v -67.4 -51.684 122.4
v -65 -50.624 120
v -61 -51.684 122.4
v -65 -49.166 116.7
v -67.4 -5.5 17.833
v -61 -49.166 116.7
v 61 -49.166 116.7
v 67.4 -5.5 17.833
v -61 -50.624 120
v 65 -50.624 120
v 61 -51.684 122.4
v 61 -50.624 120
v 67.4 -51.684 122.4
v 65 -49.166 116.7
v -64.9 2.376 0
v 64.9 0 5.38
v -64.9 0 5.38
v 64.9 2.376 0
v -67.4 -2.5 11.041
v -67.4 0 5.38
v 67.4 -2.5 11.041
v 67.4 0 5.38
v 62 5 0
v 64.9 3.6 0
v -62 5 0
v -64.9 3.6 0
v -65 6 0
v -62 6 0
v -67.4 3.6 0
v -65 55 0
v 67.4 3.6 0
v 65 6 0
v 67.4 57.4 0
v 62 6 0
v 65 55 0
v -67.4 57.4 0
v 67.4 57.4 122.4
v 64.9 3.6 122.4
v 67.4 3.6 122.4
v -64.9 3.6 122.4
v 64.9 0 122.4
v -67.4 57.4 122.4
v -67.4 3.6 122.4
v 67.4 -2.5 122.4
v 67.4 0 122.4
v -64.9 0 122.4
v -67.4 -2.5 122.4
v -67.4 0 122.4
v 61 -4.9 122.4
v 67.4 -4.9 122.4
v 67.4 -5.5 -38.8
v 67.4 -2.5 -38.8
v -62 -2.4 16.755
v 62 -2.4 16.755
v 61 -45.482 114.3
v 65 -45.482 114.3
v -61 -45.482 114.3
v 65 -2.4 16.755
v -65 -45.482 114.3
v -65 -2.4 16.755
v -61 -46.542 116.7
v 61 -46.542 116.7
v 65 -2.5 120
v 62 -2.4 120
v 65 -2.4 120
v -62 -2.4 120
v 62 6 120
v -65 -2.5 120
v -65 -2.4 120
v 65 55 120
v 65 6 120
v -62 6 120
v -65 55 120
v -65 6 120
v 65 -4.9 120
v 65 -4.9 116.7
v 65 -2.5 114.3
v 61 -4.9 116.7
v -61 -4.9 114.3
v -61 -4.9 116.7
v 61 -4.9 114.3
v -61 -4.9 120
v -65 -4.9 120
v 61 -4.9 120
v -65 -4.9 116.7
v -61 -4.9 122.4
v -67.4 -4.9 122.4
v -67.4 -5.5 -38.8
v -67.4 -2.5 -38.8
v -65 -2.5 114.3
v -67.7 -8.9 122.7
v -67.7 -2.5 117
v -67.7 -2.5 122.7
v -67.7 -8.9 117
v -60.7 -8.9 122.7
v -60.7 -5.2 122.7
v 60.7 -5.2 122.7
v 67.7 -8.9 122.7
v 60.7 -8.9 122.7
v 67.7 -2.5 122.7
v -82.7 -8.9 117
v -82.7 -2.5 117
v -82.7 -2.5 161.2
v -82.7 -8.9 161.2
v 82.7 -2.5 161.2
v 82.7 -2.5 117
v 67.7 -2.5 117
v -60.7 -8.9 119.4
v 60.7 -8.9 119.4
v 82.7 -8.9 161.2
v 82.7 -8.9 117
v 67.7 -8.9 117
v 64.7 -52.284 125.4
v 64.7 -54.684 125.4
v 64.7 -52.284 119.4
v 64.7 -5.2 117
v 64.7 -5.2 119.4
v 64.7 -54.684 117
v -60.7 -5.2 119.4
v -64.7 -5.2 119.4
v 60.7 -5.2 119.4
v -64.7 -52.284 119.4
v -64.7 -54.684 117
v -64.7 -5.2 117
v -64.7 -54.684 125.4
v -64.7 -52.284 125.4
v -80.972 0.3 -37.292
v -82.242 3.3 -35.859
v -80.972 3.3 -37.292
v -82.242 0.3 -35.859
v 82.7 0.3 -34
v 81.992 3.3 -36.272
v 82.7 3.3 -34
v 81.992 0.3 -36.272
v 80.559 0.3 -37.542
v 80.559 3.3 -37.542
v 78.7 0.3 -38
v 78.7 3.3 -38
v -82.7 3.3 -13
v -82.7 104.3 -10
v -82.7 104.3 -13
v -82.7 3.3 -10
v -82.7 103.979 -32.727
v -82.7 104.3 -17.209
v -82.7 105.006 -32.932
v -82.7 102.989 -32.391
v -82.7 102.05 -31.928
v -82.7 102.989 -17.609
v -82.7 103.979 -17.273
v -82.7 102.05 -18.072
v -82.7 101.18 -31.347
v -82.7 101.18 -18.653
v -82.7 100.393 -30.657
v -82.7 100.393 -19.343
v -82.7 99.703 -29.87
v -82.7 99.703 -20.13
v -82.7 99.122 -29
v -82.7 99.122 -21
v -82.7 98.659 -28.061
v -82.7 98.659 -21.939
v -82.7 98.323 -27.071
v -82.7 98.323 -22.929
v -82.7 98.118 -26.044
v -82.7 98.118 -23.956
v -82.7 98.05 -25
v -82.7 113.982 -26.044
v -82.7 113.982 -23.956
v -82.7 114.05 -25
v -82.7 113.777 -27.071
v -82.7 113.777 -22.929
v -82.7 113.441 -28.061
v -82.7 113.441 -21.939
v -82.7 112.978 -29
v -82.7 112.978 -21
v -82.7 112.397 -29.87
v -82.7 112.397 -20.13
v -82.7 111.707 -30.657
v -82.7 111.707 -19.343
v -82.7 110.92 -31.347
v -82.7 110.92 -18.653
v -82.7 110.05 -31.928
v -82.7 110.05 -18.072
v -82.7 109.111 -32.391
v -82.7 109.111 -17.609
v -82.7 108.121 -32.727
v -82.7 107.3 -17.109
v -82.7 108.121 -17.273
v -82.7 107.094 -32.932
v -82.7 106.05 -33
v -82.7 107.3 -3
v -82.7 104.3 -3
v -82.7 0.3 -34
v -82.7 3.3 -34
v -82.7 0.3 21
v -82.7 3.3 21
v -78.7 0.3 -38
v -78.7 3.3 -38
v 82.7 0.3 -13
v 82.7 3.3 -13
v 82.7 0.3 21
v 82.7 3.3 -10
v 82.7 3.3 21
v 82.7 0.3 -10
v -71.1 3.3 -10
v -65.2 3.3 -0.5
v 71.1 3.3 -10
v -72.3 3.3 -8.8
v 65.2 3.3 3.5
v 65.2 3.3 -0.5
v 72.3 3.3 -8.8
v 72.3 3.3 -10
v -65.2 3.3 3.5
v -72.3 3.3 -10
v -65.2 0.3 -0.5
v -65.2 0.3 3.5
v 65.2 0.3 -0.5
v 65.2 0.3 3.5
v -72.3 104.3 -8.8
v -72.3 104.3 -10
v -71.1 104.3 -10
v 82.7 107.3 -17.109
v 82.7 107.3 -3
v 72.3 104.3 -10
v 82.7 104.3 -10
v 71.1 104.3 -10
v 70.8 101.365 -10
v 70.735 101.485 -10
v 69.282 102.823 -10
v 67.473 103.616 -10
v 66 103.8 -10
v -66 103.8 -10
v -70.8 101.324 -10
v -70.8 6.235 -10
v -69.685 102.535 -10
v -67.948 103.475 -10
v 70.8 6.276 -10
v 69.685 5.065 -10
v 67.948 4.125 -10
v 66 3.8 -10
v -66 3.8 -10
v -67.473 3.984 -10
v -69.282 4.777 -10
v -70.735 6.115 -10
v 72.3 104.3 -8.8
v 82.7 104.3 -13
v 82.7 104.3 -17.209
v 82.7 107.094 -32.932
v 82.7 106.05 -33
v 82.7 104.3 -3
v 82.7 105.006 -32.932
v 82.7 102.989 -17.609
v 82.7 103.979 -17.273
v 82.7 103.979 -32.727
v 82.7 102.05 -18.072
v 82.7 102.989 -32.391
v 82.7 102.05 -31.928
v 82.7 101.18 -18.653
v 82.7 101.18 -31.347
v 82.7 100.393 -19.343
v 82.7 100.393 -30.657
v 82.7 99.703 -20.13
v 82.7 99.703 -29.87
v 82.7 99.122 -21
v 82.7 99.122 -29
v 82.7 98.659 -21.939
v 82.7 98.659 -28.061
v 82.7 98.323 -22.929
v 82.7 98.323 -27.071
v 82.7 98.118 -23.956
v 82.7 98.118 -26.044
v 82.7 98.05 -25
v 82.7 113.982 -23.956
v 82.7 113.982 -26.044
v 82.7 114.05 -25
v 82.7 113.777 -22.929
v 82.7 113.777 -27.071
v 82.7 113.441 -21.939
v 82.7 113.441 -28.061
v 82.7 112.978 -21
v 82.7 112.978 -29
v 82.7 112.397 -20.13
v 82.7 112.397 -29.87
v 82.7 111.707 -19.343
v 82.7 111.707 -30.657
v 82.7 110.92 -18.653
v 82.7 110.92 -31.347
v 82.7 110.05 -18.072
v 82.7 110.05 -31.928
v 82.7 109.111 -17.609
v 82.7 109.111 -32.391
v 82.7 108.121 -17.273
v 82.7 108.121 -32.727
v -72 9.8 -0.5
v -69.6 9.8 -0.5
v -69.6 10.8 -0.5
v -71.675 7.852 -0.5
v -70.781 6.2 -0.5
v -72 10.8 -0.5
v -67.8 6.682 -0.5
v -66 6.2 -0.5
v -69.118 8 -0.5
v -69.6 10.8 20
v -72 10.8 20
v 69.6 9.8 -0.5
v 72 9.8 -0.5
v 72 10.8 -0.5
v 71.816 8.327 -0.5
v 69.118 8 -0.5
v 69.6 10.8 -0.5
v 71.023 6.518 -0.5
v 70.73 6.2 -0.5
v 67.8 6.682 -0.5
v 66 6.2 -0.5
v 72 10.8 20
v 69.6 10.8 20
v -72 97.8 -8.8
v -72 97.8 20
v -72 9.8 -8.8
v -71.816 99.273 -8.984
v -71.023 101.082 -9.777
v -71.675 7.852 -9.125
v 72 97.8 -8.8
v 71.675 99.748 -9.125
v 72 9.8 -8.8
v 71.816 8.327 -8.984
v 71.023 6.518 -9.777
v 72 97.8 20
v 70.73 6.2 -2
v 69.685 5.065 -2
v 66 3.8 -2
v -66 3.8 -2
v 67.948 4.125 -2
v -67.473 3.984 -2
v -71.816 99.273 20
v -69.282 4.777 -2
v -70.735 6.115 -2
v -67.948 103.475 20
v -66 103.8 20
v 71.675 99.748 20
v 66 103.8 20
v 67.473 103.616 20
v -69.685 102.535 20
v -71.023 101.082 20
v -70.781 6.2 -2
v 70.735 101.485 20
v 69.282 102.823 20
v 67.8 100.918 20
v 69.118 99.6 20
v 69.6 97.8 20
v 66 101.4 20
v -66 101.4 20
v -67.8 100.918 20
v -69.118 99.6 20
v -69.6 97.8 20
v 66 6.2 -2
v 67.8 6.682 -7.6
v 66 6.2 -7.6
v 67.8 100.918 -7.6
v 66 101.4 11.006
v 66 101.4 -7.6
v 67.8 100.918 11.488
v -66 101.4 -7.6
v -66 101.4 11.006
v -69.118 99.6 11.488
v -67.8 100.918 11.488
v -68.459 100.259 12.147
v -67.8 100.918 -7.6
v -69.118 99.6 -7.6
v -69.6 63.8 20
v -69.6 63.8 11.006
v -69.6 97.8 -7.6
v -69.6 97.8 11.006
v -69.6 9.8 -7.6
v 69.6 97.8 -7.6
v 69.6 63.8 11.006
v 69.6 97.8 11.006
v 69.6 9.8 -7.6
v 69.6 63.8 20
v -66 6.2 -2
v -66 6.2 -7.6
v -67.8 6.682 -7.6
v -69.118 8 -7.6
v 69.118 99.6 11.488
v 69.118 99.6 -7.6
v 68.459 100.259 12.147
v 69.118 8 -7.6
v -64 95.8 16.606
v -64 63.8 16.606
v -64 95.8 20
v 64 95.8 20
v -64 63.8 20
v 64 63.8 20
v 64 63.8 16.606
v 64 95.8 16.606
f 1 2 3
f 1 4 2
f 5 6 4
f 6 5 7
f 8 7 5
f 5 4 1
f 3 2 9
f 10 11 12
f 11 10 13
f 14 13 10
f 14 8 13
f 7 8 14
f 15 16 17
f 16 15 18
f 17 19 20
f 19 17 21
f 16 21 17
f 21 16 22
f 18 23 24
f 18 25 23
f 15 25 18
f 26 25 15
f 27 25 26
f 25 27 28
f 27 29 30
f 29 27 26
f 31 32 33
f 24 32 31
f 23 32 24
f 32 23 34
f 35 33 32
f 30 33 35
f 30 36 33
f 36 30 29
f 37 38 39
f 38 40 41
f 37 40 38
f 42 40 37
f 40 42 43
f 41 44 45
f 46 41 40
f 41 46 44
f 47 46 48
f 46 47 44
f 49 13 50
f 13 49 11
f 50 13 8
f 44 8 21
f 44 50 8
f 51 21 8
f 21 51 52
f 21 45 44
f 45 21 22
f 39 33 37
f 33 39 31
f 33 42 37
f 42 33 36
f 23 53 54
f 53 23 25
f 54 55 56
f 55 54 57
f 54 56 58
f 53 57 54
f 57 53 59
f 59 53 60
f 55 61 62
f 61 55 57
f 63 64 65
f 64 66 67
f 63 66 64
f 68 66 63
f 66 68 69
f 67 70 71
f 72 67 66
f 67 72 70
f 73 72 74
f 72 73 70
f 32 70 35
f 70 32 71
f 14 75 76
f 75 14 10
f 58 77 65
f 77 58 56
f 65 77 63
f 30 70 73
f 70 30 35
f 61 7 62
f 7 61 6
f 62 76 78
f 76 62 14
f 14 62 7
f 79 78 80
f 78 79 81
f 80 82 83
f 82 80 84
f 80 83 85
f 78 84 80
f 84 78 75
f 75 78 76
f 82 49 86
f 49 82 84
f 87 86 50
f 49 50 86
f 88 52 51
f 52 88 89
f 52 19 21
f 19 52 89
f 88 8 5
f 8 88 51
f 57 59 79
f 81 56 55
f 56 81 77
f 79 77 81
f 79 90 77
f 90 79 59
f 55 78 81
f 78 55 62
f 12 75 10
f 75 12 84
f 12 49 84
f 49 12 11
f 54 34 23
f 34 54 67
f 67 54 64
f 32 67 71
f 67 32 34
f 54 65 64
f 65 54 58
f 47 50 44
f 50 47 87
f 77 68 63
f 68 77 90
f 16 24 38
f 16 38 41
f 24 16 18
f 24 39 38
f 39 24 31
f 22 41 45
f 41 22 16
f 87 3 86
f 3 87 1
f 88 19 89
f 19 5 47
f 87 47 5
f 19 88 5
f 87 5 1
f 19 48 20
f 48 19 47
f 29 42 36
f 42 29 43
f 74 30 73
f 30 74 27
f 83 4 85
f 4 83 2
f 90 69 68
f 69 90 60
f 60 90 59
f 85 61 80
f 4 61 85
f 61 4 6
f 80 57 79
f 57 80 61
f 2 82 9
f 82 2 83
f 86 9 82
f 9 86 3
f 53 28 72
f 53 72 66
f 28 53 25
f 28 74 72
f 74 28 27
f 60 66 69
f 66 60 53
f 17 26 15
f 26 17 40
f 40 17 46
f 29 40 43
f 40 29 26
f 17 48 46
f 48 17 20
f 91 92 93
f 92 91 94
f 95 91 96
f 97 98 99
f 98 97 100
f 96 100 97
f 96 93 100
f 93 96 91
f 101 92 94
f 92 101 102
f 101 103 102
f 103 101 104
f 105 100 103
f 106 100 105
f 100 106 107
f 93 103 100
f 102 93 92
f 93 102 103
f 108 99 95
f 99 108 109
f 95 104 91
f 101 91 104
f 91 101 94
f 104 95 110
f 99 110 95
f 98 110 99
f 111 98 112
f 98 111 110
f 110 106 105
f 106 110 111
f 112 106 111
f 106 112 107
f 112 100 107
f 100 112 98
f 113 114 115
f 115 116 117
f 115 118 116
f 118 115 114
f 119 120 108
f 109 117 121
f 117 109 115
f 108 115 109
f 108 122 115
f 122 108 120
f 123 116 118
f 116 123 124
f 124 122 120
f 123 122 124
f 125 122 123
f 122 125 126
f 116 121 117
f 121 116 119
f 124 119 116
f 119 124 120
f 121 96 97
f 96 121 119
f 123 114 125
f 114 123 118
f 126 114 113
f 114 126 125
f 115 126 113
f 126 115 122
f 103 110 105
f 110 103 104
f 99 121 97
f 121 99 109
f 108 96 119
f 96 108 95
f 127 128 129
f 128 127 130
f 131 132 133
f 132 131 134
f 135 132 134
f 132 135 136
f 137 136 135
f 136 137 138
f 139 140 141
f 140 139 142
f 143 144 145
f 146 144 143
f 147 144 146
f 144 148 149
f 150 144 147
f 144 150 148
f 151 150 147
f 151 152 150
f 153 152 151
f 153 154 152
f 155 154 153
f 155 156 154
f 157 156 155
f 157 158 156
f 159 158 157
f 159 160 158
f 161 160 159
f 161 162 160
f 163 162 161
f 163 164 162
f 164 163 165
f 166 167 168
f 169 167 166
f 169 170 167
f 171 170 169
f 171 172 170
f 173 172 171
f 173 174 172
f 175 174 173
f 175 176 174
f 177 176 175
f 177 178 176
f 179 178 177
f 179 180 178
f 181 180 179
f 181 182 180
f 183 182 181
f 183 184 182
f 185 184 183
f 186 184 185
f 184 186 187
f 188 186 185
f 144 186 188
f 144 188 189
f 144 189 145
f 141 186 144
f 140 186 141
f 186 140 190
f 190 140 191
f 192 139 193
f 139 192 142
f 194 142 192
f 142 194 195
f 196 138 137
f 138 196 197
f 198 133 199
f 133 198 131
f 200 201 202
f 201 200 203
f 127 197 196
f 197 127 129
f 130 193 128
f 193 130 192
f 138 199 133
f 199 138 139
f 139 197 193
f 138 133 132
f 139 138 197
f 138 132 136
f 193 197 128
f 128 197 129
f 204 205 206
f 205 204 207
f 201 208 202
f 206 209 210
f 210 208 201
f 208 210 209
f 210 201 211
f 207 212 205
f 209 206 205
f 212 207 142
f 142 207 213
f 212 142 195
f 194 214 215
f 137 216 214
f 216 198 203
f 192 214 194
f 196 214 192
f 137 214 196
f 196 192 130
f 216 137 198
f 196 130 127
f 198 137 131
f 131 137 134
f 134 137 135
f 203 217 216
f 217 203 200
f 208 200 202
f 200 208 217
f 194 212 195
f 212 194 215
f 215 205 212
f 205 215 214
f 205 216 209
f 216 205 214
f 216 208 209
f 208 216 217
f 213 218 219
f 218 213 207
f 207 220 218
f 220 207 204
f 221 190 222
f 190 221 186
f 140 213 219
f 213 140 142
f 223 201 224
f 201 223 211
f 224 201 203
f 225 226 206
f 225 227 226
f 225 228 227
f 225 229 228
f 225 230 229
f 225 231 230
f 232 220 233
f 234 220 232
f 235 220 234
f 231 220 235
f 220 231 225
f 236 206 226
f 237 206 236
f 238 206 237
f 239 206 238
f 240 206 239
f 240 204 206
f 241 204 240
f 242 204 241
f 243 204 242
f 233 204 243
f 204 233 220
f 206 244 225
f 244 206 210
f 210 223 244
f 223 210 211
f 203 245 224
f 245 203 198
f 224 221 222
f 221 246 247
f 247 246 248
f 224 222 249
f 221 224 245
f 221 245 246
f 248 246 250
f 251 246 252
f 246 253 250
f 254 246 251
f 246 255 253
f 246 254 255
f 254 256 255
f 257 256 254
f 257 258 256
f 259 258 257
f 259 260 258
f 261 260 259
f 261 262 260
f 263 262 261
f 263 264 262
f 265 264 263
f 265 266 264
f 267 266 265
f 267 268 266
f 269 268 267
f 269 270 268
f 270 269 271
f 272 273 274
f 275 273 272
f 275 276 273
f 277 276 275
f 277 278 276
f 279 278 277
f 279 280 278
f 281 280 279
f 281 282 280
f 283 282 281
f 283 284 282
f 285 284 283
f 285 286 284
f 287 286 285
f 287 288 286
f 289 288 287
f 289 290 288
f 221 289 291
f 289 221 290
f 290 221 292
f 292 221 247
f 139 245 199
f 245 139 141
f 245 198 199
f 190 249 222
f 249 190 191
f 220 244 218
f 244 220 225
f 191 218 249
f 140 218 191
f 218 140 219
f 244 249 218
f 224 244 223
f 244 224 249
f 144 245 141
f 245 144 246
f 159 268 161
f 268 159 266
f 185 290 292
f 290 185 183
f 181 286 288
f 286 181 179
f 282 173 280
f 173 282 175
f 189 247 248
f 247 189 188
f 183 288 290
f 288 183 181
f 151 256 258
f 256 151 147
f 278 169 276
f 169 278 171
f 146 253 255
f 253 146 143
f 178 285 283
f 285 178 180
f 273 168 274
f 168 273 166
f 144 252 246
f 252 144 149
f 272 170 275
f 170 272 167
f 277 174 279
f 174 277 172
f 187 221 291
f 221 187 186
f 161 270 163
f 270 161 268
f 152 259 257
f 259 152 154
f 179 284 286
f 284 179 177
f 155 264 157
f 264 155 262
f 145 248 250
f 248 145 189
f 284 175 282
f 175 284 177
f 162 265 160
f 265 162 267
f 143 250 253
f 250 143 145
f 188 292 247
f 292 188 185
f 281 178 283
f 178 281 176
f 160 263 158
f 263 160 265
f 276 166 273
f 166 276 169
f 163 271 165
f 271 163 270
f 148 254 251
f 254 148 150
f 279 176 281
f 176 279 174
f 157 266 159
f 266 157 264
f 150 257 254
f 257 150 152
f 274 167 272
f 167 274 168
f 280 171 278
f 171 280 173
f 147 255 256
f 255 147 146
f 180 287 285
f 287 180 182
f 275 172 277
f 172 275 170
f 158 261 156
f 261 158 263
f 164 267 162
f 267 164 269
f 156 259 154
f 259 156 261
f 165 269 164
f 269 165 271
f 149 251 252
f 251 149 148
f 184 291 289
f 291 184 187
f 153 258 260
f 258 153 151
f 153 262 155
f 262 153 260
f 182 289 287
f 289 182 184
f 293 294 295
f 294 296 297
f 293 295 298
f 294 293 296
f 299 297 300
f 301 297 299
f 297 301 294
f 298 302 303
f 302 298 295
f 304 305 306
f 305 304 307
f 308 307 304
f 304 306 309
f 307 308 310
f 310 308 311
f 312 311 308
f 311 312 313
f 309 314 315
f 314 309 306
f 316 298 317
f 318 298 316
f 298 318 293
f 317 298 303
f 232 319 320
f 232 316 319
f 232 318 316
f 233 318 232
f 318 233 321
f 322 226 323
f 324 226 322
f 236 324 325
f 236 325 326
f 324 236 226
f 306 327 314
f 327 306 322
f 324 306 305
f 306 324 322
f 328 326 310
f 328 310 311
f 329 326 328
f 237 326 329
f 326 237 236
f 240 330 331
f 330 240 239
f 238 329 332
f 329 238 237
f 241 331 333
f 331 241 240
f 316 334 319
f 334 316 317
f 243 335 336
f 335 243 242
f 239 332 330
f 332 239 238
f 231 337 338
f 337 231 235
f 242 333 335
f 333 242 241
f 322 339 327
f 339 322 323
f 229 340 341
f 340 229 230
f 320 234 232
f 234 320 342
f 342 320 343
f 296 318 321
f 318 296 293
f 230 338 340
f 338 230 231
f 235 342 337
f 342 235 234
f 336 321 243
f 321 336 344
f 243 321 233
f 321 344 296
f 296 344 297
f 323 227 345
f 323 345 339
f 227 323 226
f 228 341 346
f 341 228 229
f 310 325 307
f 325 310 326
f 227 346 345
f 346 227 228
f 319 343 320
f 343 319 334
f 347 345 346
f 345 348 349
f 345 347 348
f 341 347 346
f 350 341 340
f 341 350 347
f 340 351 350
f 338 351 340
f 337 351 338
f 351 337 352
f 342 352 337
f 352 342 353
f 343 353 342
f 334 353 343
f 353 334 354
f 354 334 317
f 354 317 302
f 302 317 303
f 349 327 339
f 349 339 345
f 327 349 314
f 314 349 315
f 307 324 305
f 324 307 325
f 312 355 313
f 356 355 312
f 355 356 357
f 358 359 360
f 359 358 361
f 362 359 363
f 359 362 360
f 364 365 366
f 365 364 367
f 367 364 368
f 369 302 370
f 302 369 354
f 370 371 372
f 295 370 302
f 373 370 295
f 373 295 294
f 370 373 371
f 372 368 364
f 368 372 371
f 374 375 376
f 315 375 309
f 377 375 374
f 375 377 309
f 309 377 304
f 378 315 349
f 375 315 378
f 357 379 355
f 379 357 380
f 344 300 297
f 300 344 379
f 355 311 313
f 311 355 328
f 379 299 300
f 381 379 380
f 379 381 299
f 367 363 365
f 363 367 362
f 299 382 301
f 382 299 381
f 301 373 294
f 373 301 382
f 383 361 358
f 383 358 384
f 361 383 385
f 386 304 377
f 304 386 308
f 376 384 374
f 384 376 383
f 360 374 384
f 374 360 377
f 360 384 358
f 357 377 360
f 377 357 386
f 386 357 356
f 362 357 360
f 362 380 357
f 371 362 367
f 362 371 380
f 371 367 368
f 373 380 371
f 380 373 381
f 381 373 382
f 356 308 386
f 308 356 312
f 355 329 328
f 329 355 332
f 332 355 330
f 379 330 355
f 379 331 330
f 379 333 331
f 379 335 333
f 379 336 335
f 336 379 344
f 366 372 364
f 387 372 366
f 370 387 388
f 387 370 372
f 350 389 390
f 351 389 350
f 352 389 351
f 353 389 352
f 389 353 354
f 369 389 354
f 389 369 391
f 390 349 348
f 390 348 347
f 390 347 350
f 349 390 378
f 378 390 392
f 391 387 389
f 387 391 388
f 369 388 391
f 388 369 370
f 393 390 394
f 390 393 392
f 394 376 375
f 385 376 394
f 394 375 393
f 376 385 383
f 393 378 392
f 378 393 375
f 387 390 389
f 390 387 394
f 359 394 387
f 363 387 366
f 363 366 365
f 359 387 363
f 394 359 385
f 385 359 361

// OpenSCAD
part = "assembly";

t        = 2.4;
W_in     = 130;
H        = 120;
y_back0  = 5;
y_backT  = -48;
y_front  = 55;
bar_d    = 2.5;
door_w   = 140;
door_h   = 170;
overlap  = 15;
clr      = 0.3;
lid_t    = 2.4;
plate_t  = 3;
groove_d = 2.5;
tray_w   = 144;
tray_d   = 100;
tray_h   = 30;
lip      = 8;
perch_d  = 16;
r_edge   = 4;
ch       = 1.2;

hw       = W_in/2;
x_out    = hw + t;
z_roof   = H + t;
run      = y_back0 - y_backT;
ang      = atan2(H, run);
th_y     = t/sin(ang);
z_door0  = -(door_h - z_roof)/2;
z_door1  = z_door0 + door_h;
z_fl0    = z_door0 - overlap;
y_fl0    = -bar_d - plate_t;
y_fl1    = -bar_d;
y_lip0   = y_fl1 - t;
z_lidbot = H - 3;
z_ledge  = z_lidbot - clr - t;
y_lid0   = y_backT - th_y - run*t/H - 3;
y_ledge0 = y_backT - th_y;
y_plate0 = clr;
y_plate1 = clr + plate_t;
x_win    = x_out - groove_d + clr;
x_plate  = door_w/2 + overlap - 2.3;
z_plate0 = -38;
z_plate1 = 3.5 + (door_w/2 + overlap - 2.3) - (W_in/2 + t - groove_d + clr) + 4;
z_shelf1 = -10;
y_tray0  = y_plate1 + 0.5;
y_shelf1 = y_tray0 + tray_d + 3.5;
perch_y  = y_shelf1 - 1.25;
perch_z  = -25;

echo(wall_angle_deg=ang, slot_width=y_front-y_back0, through_w=2*x_out, through_h=z_roof, door_z0=z_door0);

module prof_interior() polygon([[y_back0,0],[y_front,0],[y_front,H],[y_backT,H]]);
module prof_outer()    polygon([[y_back0-th_y,0],[y_front+t,0],[y_front+t,z_roof],[y_backT-th_y-run*t/H,z_roof]]);
module yz(x0,x1) translate([x0,0,0]) rotate([90,0,90]) linear_extrude(height=x1-x0) children();
module outer_prism() yz(0,x_out) prof_outer();

module under_back_wall() translate([0,y_back0-th_y,0]) rotate([-ang,0,0]) translate([-200,-150,-400]) cube([400,300,400]);

module body_half() {
  difference() {
    union() {
      difference() {
        outer_prism();
        yz(-2,hw) prof_interior();
        translate([-2, y_lid0-5, z_lidbot-clr]) cube([hw+2, y_lip0-y_lid0+5, 50]);
      }
      intersection() {
        translate([0,y_fl0,z_fl0]) cube([x_out, plate_t, 60-z_fl0]);
        under_back_wall();
      }
      translate([0,y_lip0,z_ledge]) cube([x_out, t, z_roof-z_ledge]);
      intersection() {
        union() {
          translate([hw-4,y_ledge0-3,z_ledge]) cube([4+t, y_lip0-y_ledge0+3, t]);
          translate([hw-4,y_ledge0-3,H]) cube([4+t, y_lip0-y_ledge0+3, t]);
          translate([hw-3,y_plate0-clr-t,0]) cube([3+t, plate_t+2*clr+2*t, z_roof]);
        }
        outer_prism();
      }
    }
    translate([x_out-groove_d, y_plate0-clr, -1]) cube([groove_d+1, plate_t+2*clr, z_roof+2]);
  }
}

module lid() {
  z_hb1 = z_door1 + overlap;
  lid_len = y_lip0 - clr - y_lid0;
  translate([-hw+clr, y_lid0, z_lidbot]) cube([W_in-2*clr, lid_len, lid_t]);
  translate([-hw+clr, y_lid0, z_lidbot]) cube([W_in-2*clr, t, lid_t+6]);
  translate([-x_plate, y_lip0-4, z_roof+clr]) cube([2*x_plate, 4+t, z_hb1-z_roof-clr]);
  translate([-hw+4+clr, y_lip0-4, z_lidbot]) cube([W_in-8-2*clr, 4-clr, z_roof+clr-z_lidbot]);
  for (s=[-1,1]) translate([s>0 ? x_out+clr : -x_plate, y_lip0-4, z_lidbot]) cube([x_plate-x_out-clr, 4+t, z_roof+clr-z_lidbot]);
}

module rounded_plate(w, h, r) offset(r=r) offset(delta=-r) square([w,h]);

module bracket() {
  difference() {
    translate([-x_plate, y_plate1, z_plate0]) rotate([90,0,0]) linear_extrude(height=plate_t) rounded_plate(2*x_plate, z_plate1-z_plate0, r_edge);
    translate([0, y_plate1+1, 0]) rotate([90,0,0]) linear_extrude(height=plate_t+2)
      polygon([[-x_win,-0.5],[x_win,-0.5],[x_win,3.5],[x_win+100,103.5],[-x_win-100,103.5],[-x_win,3.5]]);
  }
  translate([-x_plate, y_plate0, z_shelf1-plate_t]) cube([2*x_plate, y_shelf1-y_plate0, plate_t]);
  for (s=[-1,1]) translate([s*(tray_w/2-ch+clr), y_plate0, z_shelf1]) rotate([-90,0,0]) linear_extrude(height=y_shelf1-y_plate0)
    polygon([[0,0],[s*ch,0],[s*ch,-ch]]);
  translate([-x_plate, y_shelf1-plate_t, z_shelf1]) cube([2*x_plate, plate_t, 7]);
  translate([-x_plate, y_shelf1-plate_t, perch_z]) cube([2*x_plate, plate_t, z_shelf1-perch_z]);
  translate([-x_plate, perch_y, perch_z]) rotate([0,90,0]) cylinder(d=perch_d, h=2*x_plate, $fn=48);
}

module tray() {
  fl = 2.4; z0 = z_shelf1;
  yl = y_tray0 + 60;
  difference() {
    translate([-tray_w/2, y_tray0, z0]) linear_extrude(height=tray_h) rounded_plate(tray_w, tray_d, 6);
    translate([-tray_w/2+t, y_tray0+t, z0+fl]) linear_extrude(height=tray_h) rounded_plate(tray_w-2*t, tray_d-2*t, 6-t);
    translate([-tray_w/2-1, y_tray0-1, z0+8]) cube([tray_w+2, t+1, tray_h]);
    for (s=[-1,1]) translate([s>0 ? 64.5 : -tray_w/2-1, y_tray0-1, -0.5]) cube([tray_w/2+1-64.5, 8, tray_h]);
    for (s=[-1,1]) translate([s*tray_w/2, y_tray0-1, 0]) rotate([-90,0,0]) linear_extrude(height=tray_d+2)
      polygon([[0,-z0+1],[-s*(ch+1),-z0+1],[0,-z0-ch]]);
  }
  intersection() {
    translate([-tray_w/2, y_tray0, z0]) linear_extrude(height=tray_h) rounded_plate(tray_w, tray_d, 6);
    union() {
      translate([0, y_tray0+tray_d, z0+tray_h-lip-t*sqrt(2)]) yz(-tray_w/2, tray_w/2) polygon([[0,0],[-lip,lip],[-lip,lip+t*sqrt(2)],[0,lip+t*sqrt(2)]]);
      for (s=[-1,1]) translate([s*tray_w/2, yl, z0+tray_h-lip-t*sqrt(2)]) rotate([90,0,0]) mirror([0,0,1]) linear_extrude(height=tray_d-60)
        polygon([[0,0],[-s*lip,lip],[-s*lip,lip+t*sqrt(2)],[0,lip+t*sqrt(2)]]);
    }
  }
}

module assembly() {
  color("SteelBlue") body_half();
  color("SteelBlue") mirror([1,0,0]) body_half();
  color("Orange") lid();
  color("SeaGreen") bracket();
  color("Gold") tray();
}

if (part=="body_R") body_half();
if (part=="body_L") mirror([1,0,0]) body_half();
if (part=="lid") lid();
if (part=="bracket") bracket();
if (part=="tray") tray();
if (part=="assembly") assembly();
if (part=="section") intersection() { assembly(); translate([-400,-200,-200]) cube([400,400,400]); }
